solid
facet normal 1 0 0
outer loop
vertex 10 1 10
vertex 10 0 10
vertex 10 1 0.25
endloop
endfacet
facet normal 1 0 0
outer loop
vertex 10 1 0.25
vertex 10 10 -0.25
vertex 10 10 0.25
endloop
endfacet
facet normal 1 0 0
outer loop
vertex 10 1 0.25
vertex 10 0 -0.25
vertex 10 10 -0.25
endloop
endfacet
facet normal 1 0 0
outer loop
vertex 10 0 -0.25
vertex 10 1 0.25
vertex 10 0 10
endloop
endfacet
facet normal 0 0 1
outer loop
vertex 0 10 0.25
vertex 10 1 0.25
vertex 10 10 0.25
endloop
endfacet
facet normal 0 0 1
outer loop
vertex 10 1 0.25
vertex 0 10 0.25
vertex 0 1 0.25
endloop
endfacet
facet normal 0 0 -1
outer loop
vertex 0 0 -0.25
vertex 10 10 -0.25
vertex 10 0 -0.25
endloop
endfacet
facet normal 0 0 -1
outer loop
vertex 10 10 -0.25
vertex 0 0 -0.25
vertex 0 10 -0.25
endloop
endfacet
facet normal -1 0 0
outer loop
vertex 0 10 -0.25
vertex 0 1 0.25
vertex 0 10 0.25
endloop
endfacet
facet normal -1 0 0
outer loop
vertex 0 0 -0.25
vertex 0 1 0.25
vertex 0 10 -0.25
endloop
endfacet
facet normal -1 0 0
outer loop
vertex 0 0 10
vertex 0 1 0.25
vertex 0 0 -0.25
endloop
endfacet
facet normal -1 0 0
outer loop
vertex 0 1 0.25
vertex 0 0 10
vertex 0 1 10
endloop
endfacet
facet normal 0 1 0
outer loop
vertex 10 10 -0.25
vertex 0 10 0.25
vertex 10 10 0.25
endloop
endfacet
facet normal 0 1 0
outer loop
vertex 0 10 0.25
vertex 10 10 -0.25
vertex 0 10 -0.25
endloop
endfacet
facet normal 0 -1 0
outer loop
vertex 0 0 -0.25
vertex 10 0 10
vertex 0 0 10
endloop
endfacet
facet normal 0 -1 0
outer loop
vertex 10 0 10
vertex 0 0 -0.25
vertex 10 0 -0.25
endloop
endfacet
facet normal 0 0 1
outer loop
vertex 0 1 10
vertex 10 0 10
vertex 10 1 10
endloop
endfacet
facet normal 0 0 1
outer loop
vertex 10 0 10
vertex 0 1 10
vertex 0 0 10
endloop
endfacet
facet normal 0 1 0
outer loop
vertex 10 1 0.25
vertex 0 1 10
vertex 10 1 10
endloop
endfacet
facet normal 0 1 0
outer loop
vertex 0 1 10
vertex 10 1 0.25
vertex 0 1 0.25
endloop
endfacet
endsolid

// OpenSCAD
module makeRoom(cube_size) {
    translate([cube_size / 2, cube_size / 2 , 0])
    cube([cube_size, cube_size, 0.5], center = true);
    cube([cube_size, 1, cube_size]);
}
makeRoom(10);
